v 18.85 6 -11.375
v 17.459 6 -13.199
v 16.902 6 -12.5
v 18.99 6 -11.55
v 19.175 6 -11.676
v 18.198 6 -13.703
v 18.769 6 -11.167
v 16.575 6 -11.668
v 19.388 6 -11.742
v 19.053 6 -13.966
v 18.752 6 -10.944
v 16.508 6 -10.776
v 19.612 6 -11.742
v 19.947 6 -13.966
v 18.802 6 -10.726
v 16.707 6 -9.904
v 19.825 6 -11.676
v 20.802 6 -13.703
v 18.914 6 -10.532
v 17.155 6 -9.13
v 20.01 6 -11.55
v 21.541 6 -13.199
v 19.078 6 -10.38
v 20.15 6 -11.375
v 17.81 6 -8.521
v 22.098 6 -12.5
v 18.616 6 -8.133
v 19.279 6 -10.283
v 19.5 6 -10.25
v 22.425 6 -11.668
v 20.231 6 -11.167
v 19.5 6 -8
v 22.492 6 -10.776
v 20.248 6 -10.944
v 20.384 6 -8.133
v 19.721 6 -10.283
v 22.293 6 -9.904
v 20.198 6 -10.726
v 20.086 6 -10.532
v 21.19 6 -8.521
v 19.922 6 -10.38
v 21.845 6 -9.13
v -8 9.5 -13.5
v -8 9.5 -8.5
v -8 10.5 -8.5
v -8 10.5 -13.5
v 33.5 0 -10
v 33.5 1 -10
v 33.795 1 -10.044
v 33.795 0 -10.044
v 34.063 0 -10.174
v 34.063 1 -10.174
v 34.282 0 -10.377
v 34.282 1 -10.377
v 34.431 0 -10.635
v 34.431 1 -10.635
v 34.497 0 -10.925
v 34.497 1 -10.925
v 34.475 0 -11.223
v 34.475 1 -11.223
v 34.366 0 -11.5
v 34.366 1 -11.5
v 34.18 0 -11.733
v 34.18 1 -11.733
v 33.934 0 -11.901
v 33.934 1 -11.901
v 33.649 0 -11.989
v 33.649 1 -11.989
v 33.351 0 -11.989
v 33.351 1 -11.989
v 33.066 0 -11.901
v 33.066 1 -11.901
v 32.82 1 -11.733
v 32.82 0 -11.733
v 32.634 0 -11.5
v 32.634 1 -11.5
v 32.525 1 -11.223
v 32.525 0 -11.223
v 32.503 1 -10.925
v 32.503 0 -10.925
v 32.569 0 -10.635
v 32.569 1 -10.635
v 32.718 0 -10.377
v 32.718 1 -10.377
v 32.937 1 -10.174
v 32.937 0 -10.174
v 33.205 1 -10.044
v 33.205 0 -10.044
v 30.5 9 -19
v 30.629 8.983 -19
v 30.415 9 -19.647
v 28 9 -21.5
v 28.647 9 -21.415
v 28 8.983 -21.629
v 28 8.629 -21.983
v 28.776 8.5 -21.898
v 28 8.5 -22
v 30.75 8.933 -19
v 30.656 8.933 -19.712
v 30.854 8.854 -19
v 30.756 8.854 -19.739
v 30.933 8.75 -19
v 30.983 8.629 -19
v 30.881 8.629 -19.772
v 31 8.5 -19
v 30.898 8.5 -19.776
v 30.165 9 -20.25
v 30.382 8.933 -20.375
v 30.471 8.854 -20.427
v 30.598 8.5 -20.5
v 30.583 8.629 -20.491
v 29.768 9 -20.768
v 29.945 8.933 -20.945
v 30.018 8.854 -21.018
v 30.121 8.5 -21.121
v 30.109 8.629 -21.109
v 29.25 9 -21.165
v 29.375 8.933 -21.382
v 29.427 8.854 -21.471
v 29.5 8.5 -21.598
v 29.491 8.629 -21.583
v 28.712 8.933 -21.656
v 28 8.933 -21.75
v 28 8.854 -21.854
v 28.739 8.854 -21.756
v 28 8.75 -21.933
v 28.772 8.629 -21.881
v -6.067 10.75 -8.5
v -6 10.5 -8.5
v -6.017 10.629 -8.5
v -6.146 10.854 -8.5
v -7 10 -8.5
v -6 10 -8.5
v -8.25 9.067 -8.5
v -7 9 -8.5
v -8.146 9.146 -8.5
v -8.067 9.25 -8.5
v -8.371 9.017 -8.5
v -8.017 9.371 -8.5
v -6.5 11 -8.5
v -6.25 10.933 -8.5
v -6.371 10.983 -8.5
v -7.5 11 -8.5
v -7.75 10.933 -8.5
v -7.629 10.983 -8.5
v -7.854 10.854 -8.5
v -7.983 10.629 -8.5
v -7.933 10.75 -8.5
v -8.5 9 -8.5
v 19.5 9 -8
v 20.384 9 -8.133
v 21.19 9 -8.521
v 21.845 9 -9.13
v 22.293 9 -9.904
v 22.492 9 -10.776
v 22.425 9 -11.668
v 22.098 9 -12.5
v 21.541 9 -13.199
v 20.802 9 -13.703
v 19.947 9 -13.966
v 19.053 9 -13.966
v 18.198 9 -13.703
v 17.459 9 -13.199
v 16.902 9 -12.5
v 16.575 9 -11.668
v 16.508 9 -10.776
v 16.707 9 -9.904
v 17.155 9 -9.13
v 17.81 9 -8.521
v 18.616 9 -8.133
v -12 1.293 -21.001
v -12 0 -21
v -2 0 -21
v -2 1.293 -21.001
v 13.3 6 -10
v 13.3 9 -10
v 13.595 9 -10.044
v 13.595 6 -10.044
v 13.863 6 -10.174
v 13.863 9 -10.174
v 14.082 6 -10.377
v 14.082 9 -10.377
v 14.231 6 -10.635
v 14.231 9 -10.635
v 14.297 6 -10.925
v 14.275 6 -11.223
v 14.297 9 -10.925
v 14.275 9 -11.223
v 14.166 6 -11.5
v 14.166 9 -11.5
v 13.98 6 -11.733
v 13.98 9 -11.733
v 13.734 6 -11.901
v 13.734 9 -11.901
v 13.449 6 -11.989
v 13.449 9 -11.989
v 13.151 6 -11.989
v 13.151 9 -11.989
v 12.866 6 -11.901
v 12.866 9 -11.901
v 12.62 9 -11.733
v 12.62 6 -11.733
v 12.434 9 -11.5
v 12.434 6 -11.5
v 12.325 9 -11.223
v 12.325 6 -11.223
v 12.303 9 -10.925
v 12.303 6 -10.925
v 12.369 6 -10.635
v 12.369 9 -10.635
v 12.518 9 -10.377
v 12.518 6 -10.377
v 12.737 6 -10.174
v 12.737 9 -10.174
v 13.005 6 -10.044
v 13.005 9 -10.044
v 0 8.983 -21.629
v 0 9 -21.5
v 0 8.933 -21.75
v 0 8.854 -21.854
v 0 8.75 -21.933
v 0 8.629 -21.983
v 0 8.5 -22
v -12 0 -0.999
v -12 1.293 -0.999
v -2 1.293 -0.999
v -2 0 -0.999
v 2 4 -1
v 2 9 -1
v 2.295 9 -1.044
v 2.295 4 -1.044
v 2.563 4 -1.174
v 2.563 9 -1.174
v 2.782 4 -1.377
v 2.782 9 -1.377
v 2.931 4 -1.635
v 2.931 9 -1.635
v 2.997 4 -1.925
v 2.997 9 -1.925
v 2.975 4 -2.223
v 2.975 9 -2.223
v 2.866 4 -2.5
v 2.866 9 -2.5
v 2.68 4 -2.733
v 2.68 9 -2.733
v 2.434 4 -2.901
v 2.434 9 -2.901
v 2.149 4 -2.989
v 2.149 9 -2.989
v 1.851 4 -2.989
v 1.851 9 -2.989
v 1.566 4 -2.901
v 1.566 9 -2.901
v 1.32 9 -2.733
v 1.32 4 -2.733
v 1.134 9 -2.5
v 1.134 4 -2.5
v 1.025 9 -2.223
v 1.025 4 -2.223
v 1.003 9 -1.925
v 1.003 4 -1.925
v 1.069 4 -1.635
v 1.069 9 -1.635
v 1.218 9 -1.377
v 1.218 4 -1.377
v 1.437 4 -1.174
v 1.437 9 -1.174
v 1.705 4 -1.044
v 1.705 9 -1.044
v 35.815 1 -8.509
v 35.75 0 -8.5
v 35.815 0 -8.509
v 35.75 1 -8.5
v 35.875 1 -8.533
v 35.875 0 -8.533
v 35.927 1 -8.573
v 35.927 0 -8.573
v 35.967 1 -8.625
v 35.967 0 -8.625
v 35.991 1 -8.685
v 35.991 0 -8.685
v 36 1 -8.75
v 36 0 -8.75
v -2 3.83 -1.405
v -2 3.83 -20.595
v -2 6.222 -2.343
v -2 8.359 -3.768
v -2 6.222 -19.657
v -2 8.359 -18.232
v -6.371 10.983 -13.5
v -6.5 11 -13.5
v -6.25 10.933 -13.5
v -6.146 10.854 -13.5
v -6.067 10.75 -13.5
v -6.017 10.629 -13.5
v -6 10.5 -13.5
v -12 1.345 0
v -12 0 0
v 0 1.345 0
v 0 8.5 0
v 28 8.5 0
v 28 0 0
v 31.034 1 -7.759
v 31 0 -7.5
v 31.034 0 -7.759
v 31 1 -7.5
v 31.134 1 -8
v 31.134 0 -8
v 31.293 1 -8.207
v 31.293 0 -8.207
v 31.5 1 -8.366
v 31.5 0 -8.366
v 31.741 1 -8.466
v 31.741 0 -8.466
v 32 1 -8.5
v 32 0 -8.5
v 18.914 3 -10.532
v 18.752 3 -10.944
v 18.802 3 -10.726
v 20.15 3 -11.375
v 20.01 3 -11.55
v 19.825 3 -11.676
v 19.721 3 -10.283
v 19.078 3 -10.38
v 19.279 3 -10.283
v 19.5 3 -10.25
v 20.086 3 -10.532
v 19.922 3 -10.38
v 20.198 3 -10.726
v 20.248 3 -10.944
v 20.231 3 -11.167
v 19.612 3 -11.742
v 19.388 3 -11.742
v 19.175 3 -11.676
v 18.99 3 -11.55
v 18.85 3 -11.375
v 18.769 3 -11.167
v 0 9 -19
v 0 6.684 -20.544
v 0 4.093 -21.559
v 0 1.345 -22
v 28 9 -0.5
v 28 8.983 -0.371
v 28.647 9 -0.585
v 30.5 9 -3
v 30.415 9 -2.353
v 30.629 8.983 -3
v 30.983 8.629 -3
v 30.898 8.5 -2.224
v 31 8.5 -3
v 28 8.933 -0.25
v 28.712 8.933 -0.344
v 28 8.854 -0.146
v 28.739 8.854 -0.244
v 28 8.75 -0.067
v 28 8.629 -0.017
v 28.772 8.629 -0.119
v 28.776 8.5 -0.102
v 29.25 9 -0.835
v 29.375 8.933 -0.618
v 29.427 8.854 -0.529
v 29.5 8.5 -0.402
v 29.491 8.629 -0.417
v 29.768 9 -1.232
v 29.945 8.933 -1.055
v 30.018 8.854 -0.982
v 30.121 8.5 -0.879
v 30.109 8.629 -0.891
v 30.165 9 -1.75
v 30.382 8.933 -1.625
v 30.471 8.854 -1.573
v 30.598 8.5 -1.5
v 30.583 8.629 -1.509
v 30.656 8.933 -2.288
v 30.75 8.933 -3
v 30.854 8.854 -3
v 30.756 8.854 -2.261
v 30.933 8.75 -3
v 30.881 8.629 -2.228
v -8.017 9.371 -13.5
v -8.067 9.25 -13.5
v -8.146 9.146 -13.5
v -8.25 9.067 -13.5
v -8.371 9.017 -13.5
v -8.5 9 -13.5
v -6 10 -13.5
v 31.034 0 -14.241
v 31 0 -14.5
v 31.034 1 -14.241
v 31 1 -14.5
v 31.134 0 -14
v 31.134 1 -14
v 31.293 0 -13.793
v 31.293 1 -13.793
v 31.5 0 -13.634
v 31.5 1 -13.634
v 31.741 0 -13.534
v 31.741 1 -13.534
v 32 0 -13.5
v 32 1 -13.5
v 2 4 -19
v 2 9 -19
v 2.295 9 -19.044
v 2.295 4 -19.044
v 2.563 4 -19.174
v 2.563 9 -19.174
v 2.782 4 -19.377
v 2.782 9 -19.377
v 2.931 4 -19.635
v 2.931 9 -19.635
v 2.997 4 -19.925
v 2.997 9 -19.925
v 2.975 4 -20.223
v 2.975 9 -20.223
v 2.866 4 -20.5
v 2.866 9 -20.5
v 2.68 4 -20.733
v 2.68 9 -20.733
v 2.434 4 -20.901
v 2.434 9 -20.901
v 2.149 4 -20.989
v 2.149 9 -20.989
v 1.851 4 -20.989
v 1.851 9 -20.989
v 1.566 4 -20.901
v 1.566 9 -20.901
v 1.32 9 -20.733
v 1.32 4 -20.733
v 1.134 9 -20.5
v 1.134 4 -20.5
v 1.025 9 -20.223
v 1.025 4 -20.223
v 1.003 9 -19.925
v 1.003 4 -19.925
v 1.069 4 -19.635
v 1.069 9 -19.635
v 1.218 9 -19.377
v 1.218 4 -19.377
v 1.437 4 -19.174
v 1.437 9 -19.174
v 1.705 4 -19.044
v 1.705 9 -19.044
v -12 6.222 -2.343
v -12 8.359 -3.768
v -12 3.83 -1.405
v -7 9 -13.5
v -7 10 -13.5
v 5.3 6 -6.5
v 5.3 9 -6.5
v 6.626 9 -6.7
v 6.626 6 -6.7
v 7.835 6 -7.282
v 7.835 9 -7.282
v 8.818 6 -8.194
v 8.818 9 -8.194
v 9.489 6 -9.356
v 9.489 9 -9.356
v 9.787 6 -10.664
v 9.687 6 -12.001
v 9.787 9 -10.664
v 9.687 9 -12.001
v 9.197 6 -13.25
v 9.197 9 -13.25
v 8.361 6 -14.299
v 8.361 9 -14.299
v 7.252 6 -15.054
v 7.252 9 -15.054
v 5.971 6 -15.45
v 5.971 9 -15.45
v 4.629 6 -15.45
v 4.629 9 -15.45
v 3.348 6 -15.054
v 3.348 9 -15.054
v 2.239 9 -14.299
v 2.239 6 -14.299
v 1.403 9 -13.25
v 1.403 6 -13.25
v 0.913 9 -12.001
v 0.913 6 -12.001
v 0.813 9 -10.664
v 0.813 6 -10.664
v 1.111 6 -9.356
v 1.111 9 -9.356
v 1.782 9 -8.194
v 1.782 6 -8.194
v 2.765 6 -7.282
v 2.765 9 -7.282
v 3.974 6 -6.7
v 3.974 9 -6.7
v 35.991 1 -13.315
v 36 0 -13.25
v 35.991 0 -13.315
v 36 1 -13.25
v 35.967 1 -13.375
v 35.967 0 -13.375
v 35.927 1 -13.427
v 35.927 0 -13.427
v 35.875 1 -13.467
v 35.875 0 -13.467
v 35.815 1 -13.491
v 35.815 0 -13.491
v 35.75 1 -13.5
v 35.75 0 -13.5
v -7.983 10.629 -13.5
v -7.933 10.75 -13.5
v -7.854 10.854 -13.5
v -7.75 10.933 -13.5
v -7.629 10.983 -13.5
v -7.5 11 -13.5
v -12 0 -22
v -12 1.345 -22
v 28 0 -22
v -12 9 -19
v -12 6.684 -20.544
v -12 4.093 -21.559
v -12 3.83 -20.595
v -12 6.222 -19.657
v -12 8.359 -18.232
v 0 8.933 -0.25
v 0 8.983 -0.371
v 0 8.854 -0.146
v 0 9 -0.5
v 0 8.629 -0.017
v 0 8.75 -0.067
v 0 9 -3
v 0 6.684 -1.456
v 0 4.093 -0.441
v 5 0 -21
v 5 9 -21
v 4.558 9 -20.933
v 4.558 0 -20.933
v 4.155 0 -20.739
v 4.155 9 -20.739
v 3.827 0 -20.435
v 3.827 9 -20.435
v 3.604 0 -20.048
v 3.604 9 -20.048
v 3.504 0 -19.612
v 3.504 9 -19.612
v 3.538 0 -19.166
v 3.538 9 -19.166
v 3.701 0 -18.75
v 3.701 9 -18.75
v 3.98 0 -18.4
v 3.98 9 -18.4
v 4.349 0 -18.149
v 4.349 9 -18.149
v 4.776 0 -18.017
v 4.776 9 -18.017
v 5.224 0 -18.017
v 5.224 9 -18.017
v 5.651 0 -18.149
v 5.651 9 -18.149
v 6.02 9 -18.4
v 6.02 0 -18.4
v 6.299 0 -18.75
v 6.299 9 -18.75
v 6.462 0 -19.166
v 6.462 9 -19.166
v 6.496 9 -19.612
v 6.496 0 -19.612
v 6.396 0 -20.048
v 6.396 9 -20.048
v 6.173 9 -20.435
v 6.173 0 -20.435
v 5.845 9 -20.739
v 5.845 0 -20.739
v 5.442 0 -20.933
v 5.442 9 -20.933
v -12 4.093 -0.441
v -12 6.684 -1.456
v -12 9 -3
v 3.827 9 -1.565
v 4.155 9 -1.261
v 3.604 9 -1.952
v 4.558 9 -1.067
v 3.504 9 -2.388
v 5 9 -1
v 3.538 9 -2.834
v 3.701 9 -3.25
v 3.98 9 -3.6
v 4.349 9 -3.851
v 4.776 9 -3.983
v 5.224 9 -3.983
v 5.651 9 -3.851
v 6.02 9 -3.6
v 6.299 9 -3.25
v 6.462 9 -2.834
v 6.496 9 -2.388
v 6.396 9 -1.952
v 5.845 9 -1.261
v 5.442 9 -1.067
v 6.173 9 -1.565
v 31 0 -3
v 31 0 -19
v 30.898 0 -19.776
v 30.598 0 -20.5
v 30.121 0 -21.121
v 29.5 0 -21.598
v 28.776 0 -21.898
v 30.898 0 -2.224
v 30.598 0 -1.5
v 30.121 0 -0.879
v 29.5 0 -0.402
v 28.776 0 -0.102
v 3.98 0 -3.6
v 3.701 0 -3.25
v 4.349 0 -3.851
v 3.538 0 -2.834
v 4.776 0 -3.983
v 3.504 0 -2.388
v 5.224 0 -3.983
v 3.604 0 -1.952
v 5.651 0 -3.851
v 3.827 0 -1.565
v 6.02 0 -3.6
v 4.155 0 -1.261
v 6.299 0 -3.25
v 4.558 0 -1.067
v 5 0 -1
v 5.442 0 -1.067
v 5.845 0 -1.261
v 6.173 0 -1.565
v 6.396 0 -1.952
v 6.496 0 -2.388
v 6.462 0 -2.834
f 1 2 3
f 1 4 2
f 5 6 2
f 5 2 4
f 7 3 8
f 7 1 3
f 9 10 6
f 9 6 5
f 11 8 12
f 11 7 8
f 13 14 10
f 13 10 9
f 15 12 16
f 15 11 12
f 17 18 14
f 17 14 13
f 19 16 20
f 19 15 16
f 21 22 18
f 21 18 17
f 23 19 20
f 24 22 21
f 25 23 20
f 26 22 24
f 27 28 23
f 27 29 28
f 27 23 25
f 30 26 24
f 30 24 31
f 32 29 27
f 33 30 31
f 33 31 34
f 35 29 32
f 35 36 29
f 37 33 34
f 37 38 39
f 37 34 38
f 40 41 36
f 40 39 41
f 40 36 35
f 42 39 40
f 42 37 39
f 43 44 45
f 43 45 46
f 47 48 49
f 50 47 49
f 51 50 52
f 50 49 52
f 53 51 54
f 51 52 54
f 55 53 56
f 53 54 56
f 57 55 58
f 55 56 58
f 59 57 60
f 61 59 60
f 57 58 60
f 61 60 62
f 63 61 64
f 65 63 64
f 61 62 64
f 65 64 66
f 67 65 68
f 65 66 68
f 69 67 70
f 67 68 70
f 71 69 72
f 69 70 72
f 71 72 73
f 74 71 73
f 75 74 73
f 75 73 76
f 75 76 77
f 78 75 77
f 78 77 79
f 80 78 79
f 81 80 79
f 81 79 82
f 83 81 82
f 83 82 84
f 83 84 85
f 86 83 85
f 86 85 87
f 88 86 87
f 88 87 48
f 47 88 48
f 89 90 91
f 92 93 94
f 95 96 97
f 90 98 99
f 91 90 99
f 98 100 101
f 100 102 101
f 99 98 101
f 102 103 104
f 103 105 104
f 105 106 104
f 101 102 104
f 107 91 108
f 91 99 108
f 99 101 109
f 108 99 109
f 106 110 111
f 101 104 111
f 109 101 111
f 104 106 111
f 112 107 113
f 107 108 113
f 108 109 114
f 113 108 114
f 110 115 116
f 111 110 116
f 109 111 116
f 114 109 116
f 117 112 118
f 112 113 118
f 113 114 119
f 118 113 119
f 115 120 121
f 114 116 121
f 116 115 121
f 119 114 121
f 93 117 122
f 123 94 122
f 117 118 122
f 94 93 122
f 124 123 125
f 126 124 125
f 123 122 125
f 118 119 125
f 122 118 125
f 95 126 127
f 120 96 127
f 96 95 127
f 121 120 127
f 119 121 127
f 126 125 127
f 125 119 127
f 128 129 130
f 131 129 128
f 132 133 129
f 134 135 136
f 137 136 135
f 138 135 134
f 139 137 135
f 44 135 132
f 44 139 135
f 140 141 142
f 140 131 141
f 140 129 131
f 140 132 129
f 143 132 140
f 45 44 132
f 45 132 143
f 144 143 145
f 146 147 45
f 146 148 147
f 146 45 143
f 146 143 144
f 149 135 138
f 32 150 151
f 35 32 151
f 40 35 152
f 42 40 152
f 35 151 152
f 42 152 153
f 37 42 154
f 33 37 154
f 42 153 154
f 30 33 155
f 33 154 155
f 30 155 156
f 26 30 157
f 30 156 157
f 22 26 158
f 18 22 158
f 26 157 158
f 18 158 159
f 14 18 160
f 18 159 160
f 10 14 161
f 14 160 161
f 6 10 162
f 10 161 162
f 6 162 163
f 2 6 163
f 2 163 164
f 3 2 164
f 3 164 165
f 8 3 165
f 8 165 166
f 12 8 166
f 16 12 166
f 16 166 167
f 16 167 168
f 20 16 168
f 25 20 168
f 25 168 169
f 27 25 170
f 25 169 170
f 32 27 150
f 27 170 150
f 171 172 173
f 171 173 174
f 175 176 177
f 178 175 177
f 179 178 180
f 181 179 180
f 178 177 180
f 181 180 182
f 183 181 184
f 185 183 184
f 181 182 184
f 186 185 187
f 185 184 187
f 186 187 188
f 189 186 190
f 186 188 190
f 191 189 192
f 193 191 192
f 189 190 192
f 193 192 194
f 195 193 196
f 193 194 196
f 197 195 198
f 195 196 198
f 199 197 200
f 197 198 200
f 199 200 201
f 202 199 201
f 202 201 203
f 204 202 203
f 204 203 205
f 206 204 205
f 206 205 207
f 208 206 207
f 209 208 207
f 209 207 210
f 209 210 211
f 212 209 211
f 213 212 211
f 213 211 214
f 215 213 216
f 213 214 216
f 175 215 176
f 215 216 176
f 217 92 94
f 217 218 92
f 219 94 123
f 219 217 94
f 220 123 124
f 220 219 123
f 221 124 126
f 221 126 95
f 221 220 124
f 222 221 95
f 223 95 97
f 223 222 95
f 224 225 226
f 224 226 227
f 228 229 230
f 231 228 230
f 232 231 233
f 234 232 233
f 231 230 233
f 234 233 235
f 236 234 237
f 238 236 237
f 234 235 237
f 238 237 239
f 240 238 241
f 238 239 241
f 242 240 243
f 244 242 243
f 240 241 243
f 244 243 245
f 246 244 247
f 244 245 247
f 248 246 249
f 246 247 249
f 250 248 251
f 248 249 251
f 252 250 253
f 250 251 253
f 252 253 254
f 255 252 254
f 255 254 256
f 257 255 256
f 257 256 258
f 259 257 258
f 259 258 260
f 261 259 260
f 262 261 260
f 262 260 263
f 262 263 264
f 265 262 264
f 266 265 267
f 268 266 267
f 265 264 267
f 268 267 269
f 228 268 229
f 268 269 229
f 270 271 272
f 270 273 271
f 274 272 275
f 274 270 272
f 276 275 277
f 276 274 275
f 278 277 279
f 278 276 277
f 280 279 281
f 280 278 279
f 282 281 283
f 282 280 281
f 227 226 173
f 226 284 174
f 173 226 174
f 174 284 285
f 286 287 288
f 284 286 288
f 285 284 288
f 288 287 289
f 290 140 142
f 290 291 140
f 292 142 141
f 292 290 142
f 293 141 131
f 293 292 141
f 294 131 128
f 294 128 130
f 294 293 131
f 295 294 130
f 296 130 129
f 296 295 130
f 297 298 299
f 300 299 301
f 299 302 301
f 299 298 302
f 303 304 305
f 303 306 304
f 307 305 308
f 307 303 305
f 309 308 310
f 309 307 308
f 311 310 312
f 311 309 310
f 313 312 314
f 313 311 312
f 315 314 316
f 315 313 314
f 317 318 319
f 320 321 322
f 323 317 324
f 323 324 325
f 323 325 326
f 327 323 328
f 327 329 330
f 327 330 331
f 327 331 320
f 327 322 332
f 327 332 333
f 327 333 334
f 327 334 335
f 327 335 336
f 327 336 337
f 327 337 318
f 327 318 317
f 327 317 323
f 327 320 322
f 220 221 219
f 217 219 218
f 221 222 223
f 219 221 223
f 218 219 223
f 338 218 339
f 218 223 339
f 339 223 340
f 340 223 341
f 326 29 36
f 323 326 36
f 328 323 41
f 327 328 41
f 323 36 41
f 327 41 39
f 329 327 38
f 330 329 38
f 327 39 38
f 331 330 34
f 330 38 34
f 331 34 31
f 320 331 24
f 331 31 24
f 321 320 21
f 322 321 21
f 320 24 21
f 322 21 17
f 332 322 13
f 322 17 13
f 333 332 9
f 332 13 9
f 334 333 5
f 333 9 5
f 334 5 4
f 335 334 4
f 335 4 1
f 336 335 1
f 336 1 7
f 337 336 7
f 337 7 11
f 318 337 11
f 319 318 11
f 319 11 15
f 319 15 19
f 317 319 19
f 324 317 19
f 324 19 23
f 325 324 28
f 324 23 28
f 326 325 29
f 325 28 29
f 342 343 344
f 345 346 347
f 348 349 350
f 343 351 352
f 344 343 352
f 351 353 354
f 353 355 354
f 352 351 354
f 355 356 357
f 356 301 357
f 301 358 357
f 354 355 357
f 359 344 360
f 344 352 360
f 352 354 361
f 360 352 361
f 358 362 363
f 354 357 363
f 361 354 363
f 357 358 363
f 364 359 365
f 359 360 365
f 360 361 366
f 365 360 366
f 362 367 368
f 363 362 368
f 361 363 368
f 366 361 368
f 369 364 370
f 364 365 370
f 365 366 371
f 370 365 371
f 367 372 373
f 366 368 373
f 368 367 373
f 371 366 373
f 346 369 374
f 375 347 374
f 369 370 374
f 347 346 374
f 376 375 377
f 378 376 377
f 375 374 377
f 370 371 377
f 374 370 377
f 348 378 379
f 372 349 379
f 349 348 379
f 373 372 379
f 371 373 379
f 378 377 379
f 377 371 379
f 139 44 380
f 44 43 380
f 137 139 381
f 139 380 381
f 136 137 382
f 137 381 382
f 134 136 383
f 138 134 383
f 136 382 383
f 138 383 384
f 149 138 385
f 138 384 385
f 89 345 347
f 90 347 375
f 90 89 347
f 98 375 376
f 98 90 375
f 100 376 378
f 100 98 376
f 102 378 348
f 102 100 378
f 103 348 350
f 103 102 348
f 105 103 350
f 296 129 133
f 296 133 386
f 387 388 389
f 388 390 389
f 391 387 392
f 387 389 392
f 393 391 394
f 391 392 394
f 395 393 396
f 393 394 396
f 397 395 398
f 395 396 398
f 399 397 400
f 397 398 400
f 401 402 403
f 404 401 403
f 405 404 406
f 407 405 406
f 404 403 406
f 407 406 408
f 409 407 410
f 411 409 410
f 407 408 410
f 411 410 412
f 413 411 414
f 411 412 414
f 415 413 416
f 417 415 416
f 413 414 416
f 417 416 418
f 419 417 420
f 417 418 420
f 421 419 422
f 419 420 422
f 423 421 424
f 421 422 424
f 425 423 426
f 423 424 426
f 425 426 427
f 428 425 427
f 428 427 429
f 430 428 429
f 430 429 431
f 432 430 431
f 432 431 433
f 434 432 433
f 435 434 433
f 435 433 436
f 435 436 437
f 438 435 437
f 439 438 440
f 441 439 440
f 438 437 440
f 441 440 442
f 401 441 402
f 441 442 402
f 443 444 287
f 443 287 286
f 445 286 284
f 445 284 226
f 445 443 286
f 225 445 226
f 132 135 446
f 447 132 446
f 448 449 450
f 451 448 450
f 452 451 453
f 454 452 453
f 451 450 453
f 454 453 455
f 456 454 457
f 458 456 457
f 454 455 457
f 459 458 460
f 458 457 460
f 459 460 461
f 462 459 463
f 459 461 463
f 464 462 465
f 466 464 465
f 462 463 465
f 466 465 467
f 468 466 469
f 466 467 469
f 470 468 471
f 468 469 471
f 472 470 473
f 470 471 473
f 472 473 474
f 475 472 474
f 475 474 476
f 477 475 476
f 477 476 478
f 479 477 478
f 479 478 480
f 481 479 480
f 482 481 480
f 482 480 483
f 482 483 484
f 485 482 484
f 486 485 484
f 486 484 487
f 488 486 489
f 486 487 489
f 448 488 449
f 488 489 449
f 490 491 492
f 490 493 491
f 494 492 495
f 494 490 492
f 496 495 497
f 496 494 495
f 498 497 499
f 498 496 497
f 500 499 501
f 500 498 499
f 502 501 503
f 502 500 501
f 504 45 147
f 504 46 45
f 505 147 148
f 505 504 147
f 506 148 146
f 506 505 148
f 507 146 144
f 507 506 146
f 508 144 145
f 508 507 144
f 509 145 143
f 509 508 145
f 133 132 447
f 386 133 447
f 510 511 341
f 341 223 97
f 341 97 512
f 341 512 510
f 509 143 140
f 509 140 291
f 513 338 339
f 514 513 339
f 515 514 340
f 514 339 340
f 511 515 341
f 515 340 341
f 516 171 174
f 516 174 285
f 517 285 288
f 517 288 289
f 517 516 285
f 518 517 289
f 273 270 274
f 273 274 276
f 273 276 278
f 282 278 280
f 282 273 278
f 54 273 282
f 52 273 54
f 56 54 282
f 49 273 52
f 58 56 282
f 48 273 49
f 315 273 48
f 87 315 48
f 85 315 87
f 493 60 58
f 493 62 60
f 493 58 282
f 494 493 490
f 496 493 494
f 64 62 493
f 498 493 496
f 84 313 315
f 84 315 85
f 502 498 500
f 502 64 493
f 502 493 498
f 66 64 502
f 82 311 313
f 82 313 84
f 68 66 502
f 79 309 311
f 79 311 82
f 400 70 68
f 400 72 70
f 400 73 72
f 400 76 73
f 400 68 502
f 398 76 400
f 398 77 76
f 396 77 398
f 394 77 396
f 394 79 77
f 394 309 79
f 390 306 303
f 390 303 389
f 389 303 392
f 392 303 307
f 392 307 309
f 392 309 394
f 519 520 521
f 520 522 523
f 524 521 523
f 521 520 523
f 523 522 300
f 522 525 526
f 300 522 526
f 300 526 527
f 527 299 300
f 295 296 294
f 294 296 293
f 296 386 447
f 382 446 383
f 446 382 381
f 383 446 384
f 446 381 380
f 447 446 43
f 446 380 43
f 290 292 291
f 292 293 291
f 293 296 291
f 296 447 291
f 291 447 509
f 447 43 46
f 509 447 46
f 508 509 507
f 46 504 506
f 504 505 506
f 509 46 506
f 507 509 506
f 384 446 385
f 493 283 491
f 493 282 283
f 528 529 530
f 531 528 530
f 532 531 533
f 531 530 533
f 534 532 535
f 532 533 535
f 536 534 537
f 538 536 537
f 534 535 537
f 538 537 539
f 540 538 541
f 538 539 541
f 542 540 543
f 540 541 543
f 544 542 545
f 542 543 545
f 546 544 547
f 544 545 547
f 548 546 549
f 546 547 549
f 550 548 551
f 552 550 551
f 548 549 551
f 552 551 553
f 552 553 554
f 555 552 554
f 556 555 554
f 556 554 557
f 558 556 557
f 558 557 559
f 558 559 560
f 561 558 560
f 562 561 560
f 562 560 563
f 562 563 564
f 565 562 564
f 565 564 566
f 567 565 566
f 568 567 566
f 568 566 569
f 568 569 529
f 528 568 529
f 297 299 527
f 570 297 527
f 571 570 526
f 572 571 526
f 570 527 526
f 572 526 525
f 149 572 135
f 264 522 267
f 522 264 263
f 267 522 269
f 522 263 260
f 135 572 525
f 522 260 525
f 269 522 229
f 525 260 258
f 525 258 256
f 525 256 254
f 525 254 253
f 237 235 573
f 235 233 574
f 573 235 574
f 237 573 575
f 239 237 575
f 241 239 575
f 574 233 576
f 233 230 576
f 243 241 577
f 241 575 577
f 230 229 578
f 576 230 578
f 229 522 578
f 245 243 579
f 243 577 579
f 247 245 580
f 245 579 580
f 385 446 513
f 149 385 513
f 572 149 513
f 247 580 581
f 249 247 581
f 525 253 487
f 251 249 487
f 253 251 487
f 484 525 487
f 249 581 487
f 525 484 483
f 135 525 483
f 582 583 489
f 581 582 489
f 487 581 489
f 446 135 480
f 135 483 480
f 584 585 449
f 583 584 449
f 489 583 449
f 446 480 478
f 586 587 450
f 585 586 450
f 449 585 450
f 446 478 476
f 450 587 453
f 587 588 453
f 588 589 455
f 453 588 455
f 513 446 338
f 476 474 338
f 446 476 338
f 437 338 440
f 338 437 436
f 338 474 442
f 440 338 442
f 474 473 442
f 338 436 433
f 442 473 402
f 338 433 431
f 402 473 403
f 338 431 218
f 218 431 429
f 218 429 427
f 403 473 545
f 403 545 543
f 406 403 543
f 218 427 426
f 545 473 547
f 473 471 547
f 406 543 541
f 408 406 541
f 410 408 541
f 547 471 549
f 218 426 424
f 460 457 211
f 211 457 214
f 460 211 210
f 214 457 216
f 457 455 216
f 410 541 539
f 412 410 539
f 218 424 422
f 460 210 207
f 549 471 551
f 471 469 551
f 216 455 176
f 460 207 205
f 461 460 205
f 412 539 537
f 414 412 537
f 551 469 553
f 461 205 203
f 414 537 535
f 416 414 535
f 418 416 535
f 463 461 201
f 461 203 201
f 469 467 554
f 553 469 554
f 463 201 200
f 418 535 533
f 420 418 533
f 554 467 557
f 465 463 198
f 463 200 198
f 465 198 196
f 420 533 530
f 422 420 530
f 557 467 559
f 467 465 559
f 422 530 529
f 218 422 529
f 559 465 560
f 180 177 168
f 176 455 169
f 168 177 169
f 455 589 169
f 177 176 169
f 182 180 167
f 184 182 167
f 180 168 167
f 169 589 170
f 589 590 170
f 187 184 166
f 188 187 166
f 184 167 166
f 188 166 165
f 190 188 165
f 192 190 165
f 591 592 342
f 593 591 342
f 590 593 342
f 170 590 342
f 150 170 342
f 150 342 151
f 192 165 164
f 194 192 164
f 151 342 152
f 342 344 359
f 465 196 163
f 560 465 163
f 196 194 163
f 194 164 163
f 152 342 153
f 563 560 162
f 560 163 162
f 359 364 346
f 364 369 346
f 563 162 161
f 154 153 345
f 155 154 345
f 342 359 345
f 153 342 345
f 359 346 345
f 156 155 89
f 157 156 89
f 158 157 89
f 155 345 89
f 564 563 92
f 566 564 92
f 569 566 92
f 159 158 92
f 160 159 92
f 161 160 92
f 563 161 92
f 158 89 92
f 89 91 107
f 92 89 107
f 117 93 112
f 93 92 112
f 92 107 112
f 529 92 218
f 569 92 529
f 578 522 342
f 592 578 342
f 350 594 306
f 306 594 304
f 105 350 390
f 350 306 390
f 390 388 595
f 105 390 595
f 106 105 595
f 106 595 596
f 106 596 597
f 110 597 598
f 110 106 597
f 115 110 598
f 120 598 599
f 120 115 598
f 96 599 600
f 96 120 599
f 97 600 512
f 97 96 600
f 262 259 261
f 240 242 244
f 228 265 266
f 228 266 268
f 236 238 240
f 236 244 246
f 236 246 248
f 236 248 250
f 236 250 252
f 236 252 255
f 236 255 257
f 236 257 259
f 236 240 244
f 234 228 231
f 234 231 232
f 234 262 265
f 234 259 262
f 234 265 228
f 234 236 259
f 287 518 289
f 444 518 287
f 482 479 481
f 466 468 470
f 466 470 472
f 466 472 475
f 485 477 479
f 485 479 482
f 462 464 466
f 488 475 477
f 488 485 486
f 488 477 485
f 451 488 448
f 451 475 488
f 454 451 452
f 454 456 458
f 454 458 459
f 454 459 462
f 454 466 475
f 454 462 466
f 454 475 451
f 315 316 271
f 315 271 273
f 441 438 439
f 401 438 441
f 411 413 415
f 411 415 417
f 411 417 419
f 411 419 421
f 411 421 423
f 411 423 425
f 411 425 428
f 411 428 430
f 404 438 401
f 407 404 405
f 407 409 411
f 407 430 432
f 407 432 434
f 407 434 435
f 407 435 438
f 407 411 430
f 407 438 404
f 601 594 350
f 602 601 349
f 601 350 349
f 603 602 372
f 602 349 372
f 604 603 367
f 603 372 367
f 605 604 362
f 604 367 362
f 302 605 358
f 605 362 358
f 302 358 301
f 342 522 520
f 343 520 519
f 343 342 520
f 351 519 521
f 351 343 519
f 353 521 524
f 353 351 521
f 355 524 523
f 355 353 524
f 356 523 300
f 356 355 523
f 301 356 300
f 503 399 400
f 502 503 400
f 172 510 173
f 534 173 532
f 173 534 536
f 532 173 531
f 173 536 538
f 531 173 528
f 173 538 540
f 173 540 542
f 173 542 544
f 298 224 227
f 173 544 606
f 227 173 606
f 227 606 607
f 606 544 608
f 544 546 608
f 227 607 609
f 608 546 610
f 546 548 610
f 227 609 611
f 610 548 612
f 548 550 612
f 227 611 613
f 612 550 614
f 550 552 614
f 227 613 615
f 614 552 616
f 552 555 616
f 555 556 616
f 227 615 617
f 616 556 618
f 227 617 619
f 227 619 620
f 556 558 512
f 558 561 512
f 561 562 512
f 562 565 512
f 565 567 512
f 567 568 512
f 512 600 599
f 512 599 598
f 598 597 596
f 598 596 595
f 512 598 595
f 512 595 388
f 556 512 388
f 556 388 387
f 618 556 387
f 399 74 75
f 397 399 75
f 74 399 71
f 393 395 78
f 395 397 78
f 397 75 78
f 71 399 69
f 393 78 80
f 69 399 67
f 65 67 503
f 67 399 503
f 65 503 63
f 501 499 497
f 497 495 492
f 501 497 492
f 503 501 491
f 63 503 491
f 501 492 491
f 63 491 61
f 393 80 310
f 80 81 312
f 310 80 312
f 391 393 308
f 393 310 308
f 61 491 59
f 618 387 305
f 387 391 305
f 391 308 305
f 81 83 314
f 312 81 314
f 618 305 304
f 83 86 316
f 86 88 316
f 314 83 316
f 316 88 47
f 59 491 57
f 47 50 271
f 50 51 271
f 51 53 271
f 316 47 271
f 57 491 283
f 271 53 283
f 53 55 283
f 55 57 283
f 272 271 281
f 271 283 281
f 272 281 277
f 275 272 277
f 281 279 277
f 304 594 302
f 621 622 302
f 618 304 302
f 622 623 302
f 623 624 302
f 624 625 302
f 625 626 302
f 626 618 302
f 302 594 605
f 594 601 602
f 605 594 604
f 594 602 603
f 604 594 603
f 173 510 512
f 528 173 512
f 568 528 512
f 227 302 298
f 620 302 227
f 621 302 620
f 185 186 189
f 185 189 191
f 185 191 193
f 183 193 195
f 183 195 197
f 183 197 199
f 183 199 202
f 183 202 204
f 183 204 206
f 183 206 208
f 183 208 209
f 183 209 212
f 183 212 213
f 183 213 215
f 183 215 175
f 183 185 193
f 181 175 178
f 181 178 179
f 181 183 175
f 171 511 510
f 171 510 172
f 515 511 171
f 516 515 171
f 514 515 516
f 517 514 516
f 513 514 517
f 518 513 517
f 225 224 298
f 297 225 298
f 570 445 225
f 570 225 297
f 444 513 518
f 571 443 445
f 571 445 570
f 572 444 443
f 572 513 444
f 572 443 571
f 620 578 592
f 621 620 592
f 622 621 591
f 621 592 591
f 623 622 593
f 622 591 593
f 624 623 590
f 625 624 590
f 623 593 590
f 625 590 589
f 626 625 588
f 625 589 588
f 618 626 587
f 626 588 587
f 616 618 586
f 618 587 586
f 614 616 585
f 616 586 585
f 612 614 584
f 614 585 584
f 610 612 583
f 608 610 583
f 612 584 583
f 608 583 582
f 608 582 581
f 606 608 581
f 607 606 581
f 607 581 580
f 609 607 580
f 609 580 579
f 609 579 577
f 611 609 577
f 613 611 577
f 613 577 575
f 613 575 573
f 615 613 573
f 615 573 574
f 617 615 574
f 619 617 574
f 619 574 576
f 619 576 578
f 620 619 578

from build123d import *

# Parameters (mm, degrees)
BOSS_EXTRUDE2_DEPTH = 9
SKETCH4_W           = 5
SKETCH4_H           = 1
BOSS_EXTRUDE3_DEPTH = 5
SKETCH5_R           = 1
CUT_EXTRUDE1_DEPTH  = 5
FILLET1_R           = 1
FILLET2_R           = 1
FILLET3_R           = 3
FILLET4_R           = 3
BOSS_EXTRUDE4_DEPTH = 12
FILLET5_R           = 0.5
FILLET6_R           = 0.25
SKETCH8_R           = 3
CUT_EXTRUDE3_DEPTH  = 3
SKETCH9_R           = 0.75
CUT_EXTRUDE4_DEPTH  = 3
SKETCH10_R          = 1.5
CUT_EXTRUDE7_DEPTH  = 44.13930922
SKETCH12_R          = 1
CUT_EXTRUDE8_DEPTH  = 5
SKETCH13_W          = 1
SKETCH13_H          = 5
BOSS_EXTRUDE5_DEPTH = 2
SKETCH14_W          = 5
SKETCH14_H          = 1
BOSS_EXTRUDE6_DEPTH = 1
FILLET7_R           = 0.5
FILLET8_R           = 0.5
FILLET9_R           = 0.5
CUT_EXTRUDE9_DEPTH  = 10
SKETCH17_R          = 4.5
SKETCH17_R_2        = 1
CUT_EXTRUDE10_DEPTH = 3


with BuildPart() as part:
    # Sketch2 → Boss-Extrude2 (new body)
    with BuildSketch(Plane(origin=(0, 0, 0), x_dir=(1, 0, 0), z_dir=(0, 1, 0))):
        Polygon((0, 11), (31, 11), (31, 13.5), (31, 22), (0, 22), align=None)
        Polygon((31, 8.5), (31, 11), (0, 11), (0, 0), (31, 0), align=None)
    extrude(amount=BOSS_EXTRUDE2_DEPTH)

    # Sketch4 → Boss-Extrude3 (add)
    with BuildSketch(Plane(origin=(31, 0, 0), x_dir=(0, 0, -1), z_dir=(1, 0, 0))):
        with Locations((11, 0.5)):
            Rectangle(SKETCH4_W, SKETCH4_H)
    extrude(amount=BOSS_EXTRUDE3_DEPTH)

    # Sketch5 → Cut-Extrude1 (cut)
    with BuildSketch(Plane(origin=(0, 1, 0), x_dir=(1, 0, 0), z_dir=(0, 1, 0))):
        with Locations(Location((33.5, 11, 0), (0, 0, 270))):
            Circle(SKETCH5_R)
    extrude(amount=-CUT_EXTRUDE1_DEPTH, mode=Mode.SUBTRACT)

    # Fillet1
    fillet1_edges = [part.edges().sort_by_distance(p)[0] for p in [
        (31, 0.5, -8.5),
    ]]
    fillet(fillet1_edges, radius=FILLET1_R)

    # Fillet2
    fillet2_edges = [part.edges().sort_by_distance(p)[0] for p in [
        (31, 0.5, -13.5),
    ]]
    fillet(fillet2_edges, radius=FILLET2_R)

    # Fillet3
    fillet3_edges = [part.edges().sort_by_distance(p)[0] for p in [
        (31, 4.5, 0),
    ]]
    fillet(fillet3_edges, radius=FILLET3_R)

    # Fillet4
    fillet4_edges = [part.edges().sort_by_distance(p)[0] for p in [
        (31, 4.5, -22),
    ]]
    fillet(fillet4_edges, radius=FILLET4_R)

    # Sketch6 → Boss-Extrude4 (add)
    with BuildSketch(Plane.ZY):
        with BuildLine():
            Line((-22, 0), (-11, 0))
            Line((-11, 0), (-11, 9))
            Line((-11, 9), (-19, 9))
            ThreePointArc((-19, 9), (-21.121122912, 5.415884648), (-22, 1.344936316))
            Line((-22, 1.344936316), (-22, 0))
        make_face()
        with BuildLine():
            Line((-11, 9), (-11, 0))
            Line((-11, 0), (0, 0))
            Line((0, 0), (0, 1.344936316))
            ThreePointArc((0, 1.344936316), (-0.878877088, 5.415884648), (-3, 9))
            Line((-3, 9), (-11, 9))
        make_face()
    extrude(amount=BOSS_EXTRUDE4_DEPTH)

    # Fillet5
    fillet5_edges = [part.edges().sort_by_distance(p)[0] for p in [
        (14, 9, -22),
        (30.121320344, 9, -21.121320344),
        (31, 9, -11),
        (30.121320344, 9, -0.878679656),
        (14, 9, 0),
    ]]
    fillet(fillet5_edges, radius=FILLET5_R)

    # Fillet6
    fillet6_edges = [part.edges().sort_by_distance(p)[0] for p in [
        (36, 0.5, -13.5),
        (36, 0.5, -8.5),
    ]]
    fillet(fillet6_edges, radius=FILLET6_R)

    # Sketch8 → Cut-Extrude3 (cut)
    with BuildSketch(Plane(origin=(0, 9, 0), x_dir=(1, 0, 0), z_dir=(0, 1, 0))):
        with Locations(Location((19.5, 11, 0), (0, 0, 270))):
            Circle(SKETCH8_R)
    extrude(amount=-CUT_EXTRUDE3_DEPTH, mode=Mode.SUBTRACT)

    # Sketch9 → Cut-Extrude4 (cut)
    with BuildSketch(Plane(origin=(0, 6, 0), x_dir=(1, 0, 0), z_dir=(0, 1, 0))):
        with Locations(Location((19.5, 11, 0), (0, 0, 270))):
            Circle(SKETCH9_R)
    extrude(amount=-CUT_EXTRUDE4_DEPTH, mode=Mode.SUBTRACT)

    # Sketch10 → Cut-Extrude7 (cut, through all)
    with BuildSketch(Plane(origin=(0, 9, 0), x_dir=(1, 0, 0), z_dir=(0, 1, 0))):
        with Locations(Location((5, 19.5, 0), (0, 0, 90))):
            Circle(SKETCH10_R)
        with Locations(Location((5, 2.5, 0), (0, 0, 270))):
            Circle(SKETCH10_R)
    extrude(amount=-CUT_EXTRUDE7_DEPTH, mode=Mode.SUBTRACT)

    # Sketch12 → Cut-Extrude8 (cut)
    with BuildSketch(Plane(origin=(0, 9, 0), x_dir=(1, 0, 0), z_dir=(0, 1, 0))):
        with Locations(Location((2, 2, 0), (0, 0, 270))):
            Circle(SKETCH12_R)
        with Locations(Location((2, 20, 0), (0, 0, 270))):
            Circle(SKETCH12_R)
    extrude(amount=-CUT_EXTRUDE8_DEPTH, mode=Mode.SUBTRACT)

    # Sketch13 → Boss-Extrude5 (add)
    with BuildSketch(Plane(origin=(0, 9, 0), x_dir=(1, 0, 0), z_dir=(0, 1, 0))):
        with Locations((-7.5, 11)):
            Rectangle(SKETCH13_W, SKETCH13_H)
    extrude(amount=BOSS_EXTRUDE5_DEPTH)

    # Sketch14 → Boss-Extrude6 (add)
    with BuildSketch(Plane(origin=(-7, 0, 0), x_dir=(0, 0, -1), z_dir=(1, 0, 0))):
        with Locations((11, 10.5)):
            Rectangle(SKETCH14_W, SKETCH14_H)
    extrude(amount=BOSS_EXTRUDE6_DEPTH)

    # Fillet7
    fillet7_edges = [part.edges().sort_by_distance(p)[0] for p in [
        (-8, 11, -11),
    ]]
    fillet(fillet7_edges, radius=FILLET7_R)

    # Fillet8
    fillet8_edges = [part.edges().sort_by_distance(p)[0] for p in [
        (-8, 9, -11),
    ]]
    fillet(fillet8_edges, radius=FILLET8_R)

    # Fillet9
    fillet9_edges = [part.edges().sort_by_distance(p)[0] for p in [
        (-6, 11, -11),
    ]]
    fillet(fillet9_edges, radius=FILLET9_R)

    # Sketch16 → Cut-Extrude9 (cut)
    with BuildSketch(Plane.ZY.offset(12)):
        with BuildLine():
            Line((-18.232108037, 8.359420628), (-3.767891963, 8.359420628))
            ThreePointArc((-3.767891963, 8.359420628), (-1.809932353, 5.051006457), (-0.998661194, 1.293207997))
            Line((-0.998661194, 1.293207997), (-0.998661194, 0))
            Line((-0.998661194, 0), (-21, 0))
            Line((-21, 0), (-21.001338806, 1.293207997))
            ThreePointArc((-21.001338806, 1.293207997), (-20.190067647, 5.051006457), (-18.232108037, 8.359420628))
        make_face()
    extrude(amount=-CUT_EXTRUDE9_DEPTH, mode=Mode.SUBTRACT)

    # Sketch17 → Cut-Extrude10 (cut)
    with BuildSketch(Plane(origin=(0, 9, 0), x_dir=(1, 0, 0), z_dir=(0, 1, 0))):
        with Locations(Location((5.3, 11, 0), (0, 0, 270))):
            Circle(SKETCH17_R)
        with Locations(Location((13.3, 11, 0), (0, 0, 270))):
            Circle(SKETCH17_R_2)
    extrude(amount=-CUT_EXTRUDE10_DEPTH, mode=Mode.SUBTRACT)


solid = part.part
